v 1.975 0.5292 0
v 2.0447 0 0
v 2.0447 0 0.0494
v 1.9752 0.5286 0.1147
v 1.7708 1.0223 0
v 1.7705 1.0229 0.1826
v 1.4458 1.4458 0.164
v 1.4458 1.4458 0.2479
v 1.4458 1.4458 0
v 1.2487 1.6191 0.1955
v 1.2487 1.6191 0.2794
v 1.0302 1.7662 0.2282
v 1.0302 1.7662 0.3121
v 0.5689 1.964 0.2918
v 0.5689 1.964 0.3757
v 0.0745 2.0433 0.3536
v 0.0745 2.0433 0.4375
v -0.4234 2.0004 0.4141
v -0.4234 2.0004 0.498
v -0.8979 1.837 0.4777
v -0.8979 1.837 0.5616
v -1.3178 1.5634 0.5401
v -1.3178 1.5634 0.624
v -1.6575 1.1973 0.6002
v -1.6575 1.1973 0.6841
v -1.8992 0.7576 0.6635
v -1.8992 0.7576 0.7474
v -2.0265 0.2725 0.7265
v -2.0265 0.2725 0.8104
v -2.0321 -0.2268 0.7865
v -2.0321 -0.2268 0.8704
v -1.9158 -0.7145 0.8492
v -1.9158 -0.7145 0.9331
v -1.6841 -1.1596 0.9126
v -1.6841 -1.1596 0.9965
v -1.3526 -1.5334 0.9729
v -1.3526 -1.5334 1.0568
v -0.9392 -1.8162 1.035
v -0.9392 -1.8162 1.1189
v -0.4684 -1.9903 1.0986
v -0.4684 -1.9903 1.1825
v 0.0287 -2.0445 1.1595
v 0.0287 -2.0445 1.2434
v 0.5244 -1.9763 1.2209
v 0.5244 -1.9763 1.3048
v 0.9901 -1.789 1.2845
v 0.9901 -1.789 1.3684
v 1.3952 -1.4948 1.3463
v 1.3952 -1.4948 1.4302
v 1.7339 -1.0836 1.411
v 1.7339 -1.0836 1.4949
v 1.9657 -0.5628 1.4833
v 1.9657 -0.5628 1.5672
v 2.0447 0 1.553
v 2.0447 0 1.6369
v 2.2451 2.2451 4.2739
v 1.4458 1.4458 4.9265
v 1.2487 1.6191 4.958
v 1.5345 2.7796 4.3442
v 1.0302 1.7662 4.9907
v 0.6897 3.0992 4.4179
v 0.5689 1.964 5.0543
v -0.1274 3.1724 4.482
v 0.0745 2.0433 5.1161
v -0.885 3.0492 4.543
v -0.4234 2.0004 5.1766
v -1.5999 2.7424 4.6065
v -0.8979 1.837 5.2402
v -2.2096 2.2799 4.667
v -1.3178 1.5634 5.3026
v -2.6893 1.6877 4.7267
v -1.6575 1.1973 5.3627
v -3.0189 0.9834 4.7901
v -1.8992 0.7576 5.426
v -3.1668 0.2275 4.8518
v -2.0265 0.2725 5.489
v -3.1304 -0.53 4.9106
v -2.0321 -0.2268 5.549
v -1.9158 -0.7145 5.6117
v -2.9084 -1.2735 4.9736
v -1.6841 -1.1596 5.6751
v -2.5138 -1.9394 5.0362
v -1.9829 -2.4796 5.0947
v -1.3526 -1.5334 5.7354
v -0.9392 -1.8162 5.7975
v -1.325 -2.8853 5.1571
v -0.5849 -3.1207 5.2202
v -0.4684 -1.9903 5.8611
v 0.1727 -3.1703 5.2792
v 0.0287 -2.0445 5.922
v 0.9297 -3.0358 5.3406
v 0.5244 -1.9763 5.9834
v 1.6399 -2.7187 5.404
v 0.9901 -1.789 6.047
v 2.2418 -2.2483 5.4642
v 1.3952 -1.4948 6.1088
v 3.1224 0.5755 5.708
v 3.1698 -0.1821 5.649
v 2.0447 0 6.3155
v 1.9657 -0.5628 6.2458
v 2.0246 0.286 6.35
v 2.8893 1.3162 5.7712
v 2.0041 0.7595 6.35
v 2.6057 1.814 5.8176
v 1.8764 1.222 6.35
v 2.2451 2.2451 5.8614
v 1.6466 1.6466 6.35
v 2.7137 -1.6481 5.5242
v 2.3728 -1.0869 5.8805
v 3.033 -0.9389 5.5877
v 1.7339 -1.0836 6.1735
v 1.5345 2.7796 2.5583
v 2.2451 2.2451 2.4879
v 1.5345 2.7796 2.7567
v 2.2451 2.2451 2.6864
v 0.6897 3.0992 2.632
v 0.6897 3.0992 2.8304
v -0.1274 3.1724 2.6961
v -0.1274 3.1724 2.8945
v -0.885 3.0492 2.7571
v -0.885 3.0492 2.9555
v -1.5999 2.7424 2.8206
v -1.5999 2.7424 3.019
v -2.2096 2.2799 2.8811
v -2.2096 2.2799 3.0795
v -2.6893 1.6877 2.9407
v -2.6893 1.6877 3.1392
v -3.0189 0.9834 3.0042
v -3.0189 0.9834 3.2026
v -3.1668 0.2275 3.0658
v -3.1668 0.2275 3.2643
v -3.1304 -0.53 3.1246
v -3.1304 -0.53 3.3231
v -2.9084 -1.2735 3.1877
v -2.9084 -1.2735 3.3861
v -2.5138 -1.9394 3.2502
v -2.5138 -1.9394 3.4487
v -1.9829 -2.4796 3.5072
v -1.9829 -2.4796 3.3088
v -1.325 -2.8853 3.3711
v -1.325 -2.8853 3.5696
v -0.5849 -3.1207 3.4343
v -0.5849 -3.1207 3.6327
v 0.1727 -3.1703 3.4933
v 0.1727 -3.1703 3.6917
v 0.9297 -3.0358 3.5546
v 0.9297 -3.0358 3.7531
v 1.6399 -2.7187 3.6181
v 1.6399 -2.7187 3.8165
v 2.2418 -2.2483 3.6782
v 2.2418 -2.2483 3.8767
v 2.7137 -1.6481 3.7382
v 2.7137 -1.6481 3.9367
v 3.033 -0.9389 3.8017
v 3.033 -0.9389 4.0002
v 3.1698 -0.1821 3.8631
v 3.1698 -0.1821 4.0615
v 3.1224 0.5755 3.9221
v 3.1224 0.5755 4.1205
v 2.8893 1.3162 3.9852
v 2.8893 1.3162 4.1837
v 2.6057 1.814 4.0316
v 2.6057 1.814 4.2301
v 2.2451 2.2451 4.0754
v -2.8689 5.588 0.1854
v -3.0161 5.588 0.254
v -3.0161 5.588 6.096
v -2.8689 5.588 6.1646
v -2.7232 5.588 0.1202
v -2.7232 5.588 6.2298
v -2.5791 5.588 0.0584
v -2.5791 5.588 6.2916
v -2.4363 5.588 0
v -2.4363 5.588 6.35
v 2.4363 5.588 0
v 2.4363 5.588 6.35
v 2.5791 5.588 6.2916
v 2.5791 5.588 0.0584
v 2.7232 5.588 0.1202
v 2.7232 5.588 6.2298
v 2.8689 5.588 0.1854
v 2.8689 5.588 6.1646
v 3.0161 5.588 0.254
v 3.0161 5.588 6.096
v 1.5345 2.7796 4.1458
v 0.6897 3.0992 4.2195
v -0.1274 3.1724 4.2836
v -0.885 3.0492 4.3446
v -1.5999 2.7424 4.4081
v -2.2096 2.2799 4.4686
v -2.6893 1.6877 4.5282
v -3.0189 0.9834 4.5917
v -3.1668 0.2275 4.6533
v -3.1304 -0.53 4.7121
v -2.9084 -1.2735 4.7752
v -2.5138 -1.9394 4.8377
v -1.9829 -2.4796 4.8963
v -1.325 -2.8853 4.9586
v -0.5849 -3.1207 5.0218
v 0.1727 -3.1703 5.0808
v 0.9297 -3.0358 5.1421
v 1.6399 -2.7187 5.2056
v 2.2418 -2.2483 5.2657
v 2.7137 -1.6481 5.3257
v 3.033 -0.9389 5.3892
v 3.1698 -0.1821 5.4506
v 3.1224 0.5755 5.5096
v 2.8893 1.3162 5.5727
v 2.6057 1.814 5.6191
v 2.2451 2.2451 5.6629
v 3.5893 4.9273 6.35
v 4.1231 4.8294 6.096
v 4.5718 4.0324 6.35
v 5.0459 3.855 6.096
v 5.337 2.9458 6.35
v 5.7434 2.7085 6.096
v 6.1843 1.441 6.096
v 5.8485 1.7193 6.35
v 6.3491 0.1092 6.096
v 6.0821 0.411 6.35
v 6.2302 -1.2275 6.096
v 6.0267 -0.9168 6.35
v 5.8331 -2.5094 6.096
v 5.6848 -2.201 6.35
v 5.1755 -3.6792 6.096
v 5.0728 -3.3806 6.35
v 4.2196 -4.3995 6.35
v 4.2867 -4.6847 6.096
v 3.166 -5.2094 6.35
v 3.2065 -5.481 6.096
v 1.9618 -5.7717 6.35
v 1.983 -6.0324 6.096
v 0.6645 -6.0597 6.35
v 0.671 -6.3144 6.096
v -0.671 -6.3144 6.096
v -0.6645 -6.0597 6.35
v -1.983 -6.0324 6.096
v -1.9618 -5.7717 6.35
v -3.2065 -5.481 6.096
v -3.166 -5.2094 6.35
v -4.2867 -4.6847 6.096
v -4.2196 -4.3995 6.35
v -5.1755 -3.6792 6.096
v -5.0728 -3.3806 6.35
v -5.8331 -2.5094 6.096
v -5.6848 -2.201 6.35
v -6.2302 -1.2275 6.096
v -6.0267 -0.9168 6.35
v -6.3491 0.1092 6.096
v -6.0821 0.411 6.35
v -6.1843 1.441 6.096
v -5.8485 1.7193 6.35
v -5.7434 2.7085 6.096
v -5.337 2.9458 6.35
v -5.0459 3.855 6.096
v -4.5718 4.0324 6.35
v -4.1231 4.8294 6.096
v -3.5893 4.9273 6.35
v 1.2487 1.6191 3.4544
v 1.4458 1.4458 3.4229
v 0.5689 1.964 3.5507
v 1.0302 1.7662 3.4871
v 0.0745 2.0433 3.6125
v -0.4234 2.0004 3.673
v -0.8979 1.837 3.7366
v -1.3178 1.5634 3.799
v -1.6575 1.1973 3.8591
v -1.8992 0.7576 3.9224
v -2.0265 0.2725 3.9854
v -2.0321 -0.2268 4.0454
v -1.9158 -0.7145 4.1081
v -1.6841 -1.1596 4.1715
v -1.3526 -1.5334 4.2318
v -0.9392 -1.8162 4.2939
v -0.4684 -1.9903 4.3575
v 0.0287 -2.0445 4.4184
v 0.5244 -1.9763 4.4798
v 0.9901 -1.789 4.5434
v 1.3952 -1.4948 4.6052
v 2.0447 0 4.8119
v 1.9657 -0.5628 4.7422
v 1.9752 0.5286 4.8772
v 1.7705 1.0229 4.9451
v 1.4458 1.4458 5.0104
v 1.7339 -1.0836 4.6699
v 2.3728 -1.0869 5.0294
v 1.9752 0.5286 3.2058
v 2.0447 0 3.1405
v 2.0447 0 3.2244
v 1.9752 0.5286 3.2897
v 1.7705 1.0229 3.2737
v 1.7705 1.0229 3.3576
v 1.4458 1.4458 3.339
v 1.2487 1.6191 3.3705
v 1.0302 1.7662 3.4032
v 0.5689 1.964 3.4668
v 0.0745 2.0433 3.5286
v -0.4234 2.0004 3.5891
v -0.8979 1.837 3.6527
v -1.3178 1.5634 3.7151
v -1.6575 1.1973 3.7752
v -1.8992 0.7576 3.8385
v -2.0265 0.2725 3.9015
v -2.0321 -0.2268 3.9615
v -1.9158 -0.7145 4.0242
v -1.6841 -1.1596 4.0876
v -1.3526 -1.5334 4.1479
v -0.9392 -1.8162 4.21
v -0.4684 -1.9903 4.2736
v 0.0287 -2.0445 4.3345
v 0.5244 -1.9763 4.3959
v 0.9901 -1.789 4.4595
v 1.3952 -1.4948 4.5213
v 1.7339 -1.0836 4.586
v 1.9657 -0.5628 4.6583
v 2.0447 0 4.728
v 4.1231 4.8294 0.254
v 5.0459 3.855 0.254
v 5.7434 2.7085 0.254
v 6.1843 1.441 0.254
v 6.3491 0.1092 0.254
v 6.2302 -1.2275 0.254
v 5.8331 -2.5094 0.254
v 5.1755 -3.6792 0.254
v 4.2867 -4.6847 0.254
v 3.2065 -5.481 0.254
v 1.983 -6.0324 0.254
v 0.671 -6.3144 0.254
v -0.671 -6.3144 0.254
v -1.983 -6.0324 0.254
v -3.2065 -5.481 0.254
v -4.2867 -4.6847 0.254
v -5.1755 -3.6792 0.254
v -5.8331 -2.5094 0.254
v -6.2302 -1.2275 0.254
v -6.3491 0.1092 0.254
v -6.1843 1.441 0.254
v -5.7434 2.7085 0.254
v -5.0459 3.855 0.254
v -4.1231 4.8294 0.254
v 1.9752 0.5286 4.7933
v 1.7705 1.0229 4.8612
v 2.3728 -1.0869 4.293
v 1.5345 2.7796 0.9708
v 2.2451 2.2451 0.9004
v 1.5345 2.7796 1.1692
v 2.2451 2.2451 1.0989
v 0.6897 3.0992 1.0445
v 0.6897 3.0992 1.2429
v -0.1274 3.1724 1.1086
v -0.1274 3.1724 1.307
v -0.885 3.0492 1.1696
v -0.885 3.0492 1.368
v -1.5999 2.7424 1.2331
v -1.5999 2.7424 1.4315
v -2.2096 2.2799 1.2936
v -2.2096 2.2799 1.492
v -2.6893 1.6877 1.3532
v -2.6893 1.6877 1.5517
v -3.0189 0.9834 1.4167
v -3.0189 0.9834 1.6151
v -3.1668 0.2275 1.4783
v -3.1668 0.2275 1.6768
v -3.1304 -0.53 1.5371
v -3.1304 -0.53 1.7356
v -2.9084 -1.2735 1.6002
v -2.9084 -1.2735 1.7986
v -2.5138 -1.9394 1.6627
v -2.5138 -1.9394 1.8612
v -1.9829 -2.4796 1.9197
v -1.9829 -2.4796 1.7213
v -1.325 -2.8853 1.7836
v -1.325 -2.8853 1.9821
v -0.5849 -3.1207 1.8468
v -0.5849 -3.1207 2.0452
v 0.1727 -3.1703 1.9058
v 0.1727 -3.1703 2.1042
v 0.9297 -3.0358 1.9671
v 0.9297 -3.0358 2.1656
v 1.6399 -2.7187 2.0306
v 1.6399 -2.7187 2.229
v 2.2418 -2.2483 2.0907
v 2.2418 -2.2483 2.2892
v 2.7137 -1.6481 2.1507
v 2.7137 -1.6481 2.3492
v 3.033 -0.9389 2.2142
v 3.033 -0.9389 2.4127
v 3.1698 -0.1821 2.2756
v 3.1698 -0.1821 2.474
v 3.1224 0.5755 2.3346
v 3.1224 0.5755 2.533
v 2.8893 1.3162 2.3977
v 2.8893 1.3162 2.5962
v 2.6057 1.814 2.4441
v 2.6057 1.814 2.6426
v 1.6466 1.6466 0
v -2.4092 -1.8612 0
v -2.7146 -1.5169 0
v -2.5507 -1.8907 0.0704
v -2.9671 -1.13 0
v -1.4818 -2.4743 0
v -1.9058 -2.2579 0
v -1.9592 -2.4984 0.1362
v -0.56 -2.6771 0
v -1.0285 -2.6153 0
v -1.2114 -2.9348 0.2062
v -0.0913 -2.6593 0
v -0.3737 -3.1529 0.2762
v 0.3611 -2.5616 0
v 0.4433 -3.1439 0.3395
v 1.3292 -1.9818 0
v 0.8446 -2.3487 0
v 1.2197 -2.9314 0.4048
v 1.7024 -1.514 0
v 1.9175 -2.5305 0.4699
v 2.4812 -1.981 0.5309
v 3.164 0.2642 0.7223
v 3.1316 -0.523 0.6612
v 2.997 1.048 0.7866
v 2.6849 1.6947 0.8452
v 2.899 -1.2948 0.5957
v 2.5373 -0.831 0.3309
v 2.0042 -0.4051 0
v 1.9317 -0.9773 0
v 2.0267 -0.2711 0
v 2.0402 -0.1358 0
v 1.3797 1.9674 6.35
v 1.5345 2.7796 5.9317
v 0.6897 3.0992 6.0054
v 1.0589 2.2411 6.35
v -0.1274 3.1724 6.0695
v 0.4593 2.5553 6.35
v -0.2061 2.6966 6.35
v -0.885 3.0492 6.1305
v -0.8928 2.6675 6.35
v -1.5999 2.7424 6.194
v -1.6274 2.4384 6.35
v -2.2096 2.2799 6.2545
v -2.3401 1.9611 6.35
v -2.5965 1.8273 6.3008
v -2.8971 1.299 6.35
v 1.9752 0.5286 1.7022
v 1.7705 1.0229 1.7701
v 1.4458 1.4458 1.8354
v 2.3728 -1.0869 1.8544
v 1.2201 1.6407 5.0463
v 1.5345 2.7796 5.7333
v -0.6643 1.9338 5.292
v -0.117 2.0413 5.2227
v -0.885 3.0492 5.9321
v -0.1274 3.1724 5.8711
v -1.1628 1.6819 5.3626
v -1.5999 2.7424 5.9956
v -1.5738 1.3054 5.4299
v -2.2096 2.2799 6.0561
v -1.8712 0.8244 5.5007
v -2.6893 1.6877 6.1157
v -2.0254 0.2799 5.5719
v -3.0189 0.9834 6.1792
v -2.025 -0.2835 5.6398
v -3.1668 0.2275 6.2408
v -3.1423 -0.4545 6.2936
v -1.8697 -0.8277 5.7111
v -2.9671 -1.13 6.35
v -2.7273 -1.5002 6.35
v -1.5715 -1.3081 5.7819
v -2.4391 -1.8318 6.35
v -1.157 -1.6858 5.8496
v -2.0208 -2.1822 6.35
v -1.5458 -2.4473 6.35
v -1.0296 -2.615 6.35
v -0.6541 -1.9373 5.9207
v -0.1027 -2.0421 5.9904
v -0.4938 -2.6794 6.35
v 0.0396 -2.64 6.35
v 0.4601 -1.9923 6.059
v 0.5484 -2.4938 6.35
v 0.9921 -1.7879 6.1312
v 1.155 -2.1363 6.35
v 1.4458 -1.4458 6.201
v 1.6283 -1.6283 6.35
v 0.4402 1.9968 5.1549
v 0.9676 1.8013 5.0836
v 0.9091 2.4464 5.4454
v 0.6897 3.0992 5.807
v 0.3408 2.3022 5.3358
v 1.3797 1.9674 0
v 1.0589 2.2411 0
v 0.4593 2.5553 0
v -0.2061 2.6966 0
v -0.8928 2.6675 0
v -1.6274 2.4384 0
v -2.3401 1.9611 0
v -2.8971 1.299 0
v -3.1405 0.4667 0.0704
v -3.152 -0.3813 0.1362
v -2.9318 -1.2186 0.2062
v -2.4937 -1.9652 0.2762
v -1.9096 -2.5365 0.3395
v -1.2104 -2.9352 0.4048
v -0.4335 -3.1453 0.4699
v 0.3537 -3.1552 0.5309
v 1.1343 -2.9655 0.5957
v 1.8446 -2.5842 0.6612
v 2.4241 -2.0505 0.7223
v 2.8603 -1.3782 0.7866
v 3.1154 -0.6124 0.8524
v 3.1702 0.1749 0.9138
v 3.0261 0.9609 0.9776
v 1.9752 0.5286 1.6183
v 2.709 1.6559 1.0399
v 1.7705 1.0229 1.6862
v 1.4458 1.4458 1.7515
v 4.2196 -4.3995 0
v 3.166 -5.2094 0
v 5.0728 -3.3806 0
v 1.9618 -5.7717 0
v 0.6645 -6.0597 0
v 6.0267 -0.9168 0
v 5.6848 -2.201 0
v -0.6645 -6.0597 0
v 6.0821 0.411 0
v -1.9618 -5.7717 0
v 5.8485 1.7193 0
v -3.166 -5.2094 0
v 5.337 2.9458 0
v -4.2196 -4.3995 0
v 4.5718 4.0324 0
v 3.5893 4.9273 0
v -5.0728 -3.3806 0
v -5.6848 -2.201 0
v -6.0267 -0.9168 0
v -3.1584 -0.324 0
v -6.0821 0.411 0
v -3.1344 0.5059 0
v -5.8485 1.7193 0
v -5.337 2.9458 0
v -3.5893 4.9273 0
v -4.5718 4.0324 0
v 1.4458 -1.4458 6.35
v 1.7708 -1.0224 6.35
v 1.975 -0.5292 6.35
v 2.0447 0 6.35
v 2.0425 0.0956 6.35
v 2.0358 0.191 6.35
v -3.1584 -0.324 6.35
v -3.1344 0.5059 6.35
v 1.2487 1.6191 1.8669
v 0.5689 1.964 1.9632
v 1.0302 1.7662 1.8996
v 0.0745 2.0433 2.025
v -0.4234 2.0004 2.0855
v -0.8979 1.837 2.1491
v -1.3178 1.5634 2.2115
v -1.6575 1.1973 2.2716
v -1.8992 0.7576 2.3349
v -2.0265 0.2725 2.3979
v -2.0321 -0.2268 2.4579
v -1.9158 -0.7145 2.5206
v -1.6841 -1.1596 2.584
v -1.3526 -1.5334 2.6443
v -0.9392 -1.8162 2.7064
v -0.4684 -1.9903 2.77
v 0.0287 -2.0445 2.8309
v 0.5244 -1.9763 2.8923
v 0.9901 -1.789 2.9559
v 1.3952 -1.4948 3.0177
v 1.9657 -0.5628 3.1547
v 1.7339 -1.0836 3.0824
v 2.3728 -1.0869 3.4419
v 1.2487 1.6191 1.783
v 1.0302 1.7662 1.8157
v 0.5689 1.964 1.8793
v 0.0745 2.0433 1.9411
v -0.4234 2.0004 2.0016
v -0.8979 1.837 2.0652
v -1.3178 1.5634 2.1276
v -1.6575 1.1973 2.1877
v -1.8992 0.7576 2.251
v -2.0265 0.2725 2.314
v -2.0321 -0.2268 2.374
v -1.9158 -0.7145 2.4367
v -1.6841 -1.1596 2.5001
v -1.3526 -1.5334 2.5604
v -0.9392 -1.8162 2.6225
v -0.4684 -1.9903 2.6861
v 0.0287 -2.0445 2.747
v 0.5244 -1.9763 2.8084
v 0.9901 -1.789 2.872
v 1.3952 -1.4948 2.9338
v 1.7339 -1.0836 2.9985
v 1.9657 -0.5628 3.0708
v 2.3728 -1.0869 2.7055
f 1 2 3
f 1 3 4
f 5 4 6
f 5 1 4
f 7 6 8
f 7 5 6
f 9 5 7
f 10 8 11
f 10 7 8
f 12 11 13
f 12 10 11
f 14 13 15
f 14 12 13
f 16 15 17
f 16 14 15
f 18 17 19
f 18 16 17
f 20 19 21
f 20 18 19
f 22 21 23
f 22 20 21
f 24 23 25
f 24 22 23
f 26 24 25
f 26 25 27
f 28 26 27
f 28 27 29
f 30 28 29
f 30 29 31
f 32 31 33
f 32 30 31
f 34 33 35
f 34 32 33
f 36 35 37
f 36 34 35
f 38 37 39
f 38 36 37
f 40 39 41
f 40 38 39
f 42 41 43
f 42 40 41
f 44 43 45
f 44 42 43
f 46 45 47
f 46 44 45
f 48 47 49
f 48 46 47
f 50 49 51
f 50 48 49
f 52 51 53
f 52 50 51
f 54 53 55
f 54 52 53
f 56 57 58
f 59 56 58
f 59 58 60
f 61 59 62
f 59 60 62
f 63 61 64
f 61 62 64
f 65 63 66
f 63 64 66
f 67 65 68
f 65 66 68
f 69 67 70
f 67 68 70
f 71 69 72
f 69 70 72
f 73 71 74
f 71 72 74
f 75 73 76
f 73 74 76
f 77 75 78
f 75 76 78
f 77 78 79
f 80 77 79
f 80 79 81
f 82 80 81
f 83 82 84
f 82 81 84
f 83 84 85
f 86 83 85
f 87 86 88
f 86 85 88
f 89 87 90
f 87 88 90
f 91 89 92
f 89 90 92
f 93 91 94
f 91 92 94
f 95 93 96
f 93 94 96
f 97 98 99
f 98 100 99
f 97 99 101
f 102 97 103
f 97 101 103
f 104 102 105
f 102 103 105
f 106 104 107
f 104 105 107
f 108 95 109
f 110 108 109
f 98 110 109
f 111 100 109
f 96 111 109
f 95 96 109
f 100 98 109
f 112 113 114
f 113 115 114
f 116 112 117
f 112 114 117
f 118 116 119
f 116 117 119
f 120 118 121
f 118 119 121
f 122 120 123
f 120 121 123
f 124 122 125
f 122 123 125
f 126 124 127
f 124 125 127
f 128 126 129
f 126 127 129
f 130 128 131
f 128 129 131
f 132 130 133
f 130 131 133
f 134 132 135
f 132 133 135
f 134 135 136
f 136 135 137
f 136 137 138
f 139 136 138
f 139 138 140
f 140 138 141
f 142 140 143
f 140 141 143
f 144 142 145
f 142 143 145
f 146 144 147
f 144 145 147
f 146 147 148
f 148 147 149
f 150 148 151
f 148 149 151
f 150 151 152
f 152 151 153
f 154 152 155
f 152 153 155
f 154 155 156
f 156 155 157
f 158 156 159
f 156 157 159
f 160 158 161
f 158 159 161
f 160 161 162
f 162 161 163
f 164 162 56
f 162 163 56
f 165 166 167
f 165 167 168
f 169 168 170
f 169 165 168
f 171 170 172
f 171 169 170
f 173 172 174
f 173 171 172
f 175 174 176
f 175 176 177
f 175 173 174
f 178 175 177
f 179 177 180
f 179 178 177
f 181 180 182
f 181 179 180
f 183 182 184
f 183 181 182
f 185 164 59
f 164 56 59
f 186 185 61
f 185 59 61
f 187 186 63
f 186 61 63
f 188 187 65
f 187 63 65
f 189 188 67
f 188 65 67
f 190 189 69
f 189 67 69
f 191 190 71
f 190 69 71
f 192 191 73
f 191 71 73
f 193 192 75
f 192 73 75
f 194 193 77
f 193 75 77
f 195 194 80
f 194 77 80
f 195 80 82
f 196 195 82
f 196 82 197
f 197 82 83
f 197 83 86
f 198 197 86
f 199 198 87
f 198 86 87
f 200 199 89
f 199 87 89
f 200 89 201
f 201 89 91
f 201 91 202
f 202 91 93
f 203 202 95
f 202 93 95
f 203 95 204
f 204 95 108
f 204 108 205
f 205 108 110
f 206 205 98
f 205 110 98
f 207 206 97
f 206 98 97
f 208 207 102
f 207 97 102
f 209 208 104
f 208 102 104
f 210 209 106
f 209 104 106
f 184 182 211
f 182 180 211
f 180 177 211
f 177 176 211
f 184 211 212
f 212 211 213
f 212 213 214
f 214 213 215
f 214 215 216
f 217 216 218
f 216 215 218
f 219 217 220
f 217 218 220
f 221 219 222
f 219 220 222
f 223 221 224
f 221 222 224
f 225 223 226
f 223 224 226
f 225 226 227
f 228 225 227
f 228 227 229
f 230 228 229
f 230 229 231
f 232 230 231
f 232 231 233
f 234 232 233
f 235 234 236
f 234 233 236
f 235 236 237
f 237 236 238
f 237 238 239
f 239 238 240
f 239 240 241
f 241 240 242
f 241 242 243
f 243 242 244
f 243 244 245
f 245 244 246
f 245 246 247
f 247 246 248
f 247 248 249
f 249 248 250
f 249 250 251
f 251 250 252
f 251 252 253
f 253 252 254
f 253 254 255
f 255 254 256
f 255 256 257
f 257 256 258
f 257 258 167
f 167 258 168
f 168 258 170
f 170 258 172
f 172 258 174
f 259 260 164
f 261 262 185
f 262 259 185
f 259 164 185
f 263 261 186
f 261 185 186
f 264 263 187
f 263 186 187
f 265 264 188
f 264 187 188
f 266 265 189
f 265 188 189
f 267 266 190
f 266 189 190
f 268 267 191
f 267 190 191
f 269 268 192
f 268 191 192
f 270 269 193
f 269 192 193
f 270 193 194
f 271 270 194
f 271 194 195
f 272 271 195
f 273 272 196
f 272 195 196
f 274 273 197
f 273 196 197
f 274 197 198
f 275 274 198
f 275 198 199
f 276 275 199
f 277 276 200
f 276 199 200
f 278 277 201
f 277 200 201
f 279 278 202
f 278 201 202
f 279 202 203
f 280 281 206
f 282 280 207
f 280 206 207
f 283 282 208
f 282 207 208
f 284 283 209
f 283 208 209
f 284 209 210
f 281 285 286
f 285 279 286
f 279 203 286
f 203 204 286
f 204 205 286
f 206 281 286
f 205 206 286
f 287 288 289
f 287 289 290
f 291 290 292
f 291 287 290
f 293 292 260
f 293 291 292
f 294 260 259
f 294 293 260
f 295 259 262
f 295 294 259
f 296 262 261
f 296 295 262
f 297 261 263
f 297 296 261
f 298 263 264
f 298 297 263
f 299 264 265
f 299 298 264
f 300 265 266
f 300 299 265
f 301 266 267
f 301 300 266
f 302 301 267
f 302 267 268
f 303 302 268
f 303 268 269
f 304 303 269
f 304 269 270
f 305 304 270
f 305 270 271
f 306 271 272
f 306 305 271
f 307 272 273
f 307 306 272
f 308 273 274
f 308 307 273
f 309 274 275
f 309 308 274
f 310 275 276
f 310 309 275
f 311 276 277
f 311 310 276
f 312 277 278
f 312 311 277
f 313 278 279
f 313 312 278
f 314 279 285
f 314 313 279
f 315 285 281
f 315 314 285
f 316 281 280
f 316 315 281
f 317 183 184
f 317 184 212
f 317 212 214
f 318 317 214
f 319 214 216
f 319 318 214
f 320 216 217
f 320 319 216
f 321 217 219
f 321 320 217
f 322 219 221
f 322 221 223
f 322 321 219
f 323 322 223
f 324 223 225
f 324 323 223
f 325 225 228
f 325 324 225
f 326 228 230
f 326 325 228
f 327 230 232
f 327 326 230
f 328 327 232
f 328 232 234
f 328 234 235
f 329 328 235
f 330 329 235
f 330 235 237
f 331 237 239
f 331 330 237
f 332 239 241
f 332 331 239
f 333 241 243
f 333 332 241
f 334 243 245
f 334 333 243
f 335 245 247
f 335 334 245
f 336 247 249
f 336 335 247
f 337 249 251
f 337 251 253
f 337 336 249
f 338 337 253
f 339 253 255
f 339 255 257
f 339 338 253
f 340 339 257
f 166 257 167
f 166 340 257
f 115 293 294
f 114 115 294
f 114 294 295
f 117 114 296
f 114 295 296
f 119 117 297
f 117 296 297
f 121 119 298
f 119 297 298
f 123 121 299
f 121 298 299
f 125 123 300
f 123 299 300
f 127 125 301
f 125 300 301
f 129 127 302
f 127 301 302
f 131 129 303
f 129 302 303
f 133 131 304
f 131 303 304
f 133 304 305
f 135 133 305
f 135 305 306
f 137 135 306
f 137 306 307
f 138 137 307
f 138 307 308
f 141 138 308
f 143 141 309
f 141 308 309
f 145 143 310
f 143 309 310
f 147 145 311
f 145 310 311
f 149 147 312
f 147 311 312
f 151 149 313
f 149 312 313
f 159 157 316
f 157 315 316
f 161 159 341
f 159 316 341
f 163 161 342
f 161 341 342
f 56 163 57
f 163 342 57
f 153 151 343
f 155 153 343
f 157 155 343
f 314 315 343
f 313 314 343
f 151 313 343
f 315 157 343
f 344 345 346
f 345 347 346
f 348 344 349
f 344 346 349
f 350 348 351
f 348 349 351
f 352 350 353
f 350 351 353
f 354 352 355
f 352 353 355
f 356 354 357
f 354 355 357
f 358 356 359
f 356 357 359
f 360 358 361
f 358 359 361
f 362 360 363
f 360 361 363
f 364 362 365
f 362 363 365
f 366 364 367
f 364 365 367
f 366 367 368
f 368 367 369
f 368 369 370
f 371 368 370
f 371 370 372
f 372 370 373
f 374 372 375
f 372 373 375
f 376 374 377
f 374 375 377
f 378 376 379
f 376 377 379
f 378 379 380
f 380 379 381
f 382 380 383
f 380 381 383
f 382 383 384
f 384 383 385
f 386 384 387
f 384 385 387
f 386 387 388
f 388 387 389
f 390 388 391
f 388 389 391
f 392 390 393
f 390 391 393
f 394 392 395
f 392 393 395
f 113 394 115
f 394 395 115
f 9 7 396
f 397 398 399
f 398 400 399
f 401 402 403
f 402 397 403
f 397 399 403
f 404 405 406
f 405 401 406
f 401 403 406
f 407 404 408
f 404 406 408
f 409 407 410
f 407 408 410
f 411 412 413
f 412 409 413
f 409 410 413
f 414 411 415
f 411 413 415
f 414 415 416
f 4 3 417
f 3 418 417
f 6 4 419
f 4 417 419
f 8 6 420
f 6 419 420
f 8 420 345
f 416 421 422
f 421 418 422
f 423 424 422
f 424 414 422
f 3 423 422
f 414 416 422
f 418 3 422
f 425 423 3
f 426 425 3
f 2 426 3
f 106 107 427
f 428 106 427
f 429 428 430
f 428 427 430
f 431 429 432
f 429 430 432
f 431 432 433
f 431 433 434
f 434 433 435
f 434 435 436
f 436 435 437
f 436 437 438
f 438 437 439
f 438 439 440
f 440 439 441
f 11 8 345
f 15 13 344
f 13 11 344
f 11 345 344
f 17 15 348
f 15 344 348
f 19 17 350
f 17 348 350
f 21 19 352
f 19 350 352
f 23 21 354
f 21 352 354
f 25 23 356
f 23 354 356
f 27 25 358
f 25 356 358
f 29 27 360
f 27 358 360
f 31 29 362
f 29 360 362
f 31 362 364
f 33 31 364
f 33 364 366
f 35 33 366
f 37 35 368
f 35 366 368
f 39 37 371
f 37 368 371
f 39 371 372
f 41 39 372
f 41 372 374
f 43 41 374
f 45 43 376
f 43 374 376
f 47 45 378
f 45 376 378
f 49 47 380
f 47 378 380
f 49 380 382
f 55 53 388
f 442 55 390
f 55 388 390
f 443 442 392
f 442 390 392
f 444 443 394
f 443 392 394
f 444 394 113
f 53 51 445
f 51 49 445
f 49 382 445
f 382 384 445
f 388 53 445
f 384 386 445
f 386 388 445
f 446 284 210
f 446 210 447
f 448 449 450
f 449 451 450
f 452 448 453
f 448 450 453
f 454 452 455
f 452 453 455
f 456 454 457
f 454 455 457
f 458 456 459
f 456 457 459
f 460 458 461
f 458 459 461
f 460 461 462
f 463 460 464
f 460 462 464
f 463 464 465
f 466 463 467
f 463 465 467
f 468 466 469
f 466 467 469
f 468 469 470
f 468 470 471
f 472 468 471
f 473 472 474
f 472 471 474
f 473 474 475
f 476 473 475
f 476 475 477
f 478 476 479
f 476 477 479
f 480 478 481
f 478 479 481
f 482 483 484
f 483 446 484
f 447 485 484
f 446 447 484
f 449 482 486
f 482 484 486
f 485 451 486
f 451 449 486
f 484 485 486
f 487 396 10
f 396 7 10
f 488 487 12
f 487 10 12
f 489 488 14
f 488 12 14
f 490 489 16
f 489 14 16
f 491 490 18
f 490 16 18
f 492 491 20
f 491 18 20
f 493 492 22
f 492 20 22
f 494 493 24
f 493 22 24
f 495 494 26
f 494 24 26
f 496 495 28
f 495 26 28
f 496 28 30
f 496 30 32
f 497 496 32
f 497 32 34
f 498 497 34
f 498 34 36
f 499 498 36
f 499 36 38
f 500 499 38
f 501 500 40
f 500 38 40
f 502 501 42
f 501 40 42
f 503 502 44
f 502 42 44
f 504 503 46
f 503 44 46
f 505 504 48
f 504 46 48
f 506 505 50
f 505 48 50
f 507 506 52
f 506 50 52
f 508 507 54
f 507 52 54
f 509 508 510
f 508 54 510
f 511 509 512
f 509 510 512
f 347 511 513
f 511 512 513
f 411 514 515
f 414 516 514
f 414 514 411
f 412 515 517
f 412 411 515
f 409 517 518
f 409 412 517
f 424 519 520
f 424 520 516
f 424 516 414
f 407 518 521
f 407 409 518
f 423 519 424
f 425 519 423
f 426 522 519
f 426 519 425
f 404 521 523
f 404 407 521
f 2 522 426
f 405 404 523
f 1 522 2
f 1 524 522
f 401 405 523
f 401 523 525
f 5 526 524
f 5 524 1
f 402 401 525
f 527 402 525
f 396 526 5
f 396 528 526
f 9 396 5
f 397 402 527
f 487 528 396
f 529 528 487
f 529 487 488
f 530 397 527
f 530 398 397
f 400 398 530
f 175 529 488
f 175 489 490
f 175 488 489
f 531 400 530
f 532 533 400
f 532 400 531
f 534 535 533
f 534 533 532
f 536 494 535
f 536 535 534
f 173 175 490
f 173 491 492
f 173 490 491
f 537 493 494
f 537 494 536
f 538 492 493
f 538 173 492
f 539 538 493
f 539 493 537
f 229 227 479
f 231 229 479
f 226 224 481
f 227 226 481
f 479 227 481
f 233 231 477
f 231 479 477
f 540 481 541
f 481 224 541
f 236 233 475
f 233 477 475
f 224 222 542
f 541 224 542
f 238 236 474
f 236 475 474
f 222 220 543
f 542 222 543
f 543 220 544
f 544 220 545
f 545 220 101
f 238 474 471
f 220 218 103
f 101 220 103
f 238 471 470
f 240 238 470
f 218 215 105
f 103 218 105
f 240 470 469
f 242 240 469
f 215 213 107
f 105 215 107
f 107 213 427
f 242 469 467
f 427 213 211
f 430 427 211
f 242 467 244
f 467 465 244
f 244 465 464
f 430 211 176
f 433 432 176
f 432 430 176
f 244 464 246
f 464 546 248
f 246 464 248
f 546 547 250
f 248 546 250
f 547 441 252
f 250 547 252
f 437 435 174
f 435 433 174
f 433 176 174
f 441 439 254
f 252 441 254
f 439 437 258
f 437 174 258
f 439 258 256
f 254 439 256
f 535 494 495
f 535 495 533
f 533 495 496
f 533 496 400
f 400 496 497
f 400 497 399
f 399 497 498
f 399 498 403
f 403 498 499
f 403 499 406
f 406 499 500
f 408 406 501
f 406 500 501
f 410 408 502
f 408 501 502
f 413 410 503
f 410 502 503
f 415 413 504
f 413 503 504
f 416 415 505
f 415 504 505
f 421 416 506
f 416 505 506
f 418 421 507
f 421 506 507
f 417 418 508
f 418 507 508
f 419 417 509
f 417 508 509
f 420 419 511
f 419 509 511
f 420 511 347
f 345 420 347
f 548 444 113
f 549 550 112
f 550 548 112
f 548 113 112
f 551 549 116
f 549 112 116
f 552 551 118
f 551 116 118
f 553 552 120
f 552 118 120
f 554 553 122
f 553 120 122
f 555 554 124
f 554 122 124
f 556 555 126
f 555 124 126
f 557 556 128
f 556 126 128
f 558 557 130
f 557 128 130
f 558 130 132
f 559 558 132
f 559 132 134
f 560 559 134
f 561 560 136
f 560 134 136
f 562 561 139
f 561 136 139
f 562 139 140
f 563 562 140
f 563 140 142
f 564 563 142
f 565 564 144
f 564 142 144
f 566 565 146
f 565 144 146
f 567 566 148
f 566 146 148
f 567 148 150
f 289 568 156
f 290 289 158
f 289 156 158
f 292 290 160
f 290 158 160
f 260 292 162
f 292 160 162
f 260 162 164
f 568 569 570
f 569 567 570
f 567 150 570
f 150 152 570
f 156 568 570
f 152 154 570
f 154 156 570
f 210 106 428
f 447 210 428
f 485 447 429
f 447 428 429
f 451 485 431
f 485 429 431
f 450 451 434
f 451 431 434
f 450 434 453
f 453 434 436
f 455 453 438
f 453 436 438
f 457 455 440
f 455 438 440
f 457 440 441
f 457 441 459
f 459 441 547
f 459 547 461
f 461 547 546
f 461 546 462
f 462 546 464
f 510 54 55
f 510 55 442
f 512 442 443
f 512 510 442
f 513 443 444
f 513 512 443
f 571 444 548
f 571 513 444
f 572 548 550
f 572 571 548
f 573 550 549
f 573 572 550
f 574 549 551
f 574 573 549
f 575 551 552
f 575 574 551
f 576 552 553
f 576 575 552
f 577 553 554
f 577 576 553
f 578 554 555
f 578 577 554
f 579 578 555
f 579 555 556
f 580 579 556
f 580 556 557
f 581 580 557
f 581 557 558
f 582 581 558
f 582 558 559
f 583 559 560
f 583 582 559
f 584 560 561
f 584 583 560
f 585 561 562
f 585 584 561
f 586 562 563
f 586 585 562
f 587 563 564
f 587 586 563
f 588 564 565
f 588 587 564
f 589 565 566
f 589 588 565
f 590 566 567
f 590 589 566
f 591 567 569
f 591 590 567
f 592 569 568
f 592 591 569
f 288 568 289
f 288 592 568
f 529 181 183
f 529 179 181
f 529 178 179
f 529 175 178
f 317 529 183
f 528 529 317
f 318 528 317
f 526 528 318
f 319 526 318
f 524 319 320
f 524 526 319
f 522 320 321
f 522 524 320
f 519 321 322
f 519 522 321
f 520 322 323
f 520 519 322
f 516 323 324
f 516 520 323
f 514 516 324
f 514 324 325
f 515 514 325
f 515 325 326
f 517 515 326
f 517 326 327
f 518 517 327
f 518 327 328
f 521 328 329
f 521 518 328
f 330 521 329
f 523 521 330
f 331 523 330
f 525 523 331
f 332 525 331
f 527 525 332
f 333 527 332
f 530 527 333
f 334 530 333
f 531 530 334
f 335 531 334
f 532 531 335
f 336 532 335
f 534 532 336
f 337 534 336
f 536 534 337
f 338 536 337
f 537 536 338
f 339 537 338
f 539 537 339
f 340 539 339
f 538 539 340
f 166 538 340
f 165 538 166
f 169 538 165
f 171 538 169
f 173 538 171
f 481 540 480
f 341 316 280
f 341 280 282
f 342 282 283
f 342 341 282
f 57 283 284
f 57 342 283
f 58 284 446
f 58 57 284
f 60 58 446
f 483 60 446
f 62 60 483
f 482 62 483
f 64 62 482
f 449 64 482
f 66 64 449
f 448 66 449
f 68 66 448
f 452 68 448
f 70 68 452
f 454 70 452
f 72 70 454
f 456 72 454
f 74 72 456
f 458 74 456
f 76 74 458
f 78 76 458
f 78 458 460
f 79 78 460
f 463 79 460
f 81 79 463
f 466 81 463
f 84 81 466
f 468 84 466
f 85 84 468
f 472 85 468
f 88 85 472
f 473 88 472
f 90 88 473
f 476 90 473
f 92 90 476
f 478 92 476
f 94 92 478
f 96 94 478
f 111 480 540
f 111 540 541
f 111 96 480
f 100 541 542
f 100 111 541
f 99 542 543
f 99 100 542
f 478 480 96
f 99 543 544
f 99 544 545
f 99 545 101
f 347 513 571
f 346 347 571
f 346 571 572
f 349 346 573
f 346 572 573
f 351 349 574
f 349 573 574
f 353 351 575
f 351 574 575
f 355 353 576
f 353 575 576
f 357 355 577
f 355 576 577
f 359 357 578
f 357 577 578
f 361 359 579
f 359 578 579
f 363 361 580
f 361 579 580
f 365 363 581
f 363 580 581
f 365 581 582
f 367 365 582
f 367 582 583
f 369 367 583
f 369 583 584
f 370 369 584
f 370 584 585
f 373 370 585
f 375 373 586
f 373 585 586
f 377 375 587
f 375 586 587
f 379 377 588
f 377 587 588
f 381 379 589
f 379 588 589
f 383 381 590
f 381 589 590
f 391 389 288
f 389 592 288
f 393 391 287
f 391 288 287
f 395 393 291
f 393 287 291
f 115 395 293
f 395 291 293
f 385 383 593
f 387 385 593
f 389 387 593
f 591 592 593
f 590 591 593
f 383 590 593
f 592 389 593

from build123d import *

# Parameters (mm, degrees)
SKETCH1_R           = 2.0447
BOSS_EXTRUDE1_DEPTH = 6.35
CUT_SWEEP1_PITCH    = 1.5875
CHAMFER1_SIZE       = 0.254


with BuildPart() as part:
    # Sketch1 → Boss-Extrude1 (new body)
    with BuildSketch(Plane.XY):
        with BuildLine():
            Line((-3.01608289, 5.588), (3.01608289, 5.588))
            ThreePointArc((3.01608289, 5.588), (0, -6.35), (-3.01608289, 5.588))
        make_face()
        Circle(SKETCH1_R, mode=Mode.SUBTRACT)
    extrude(amount=BOSS_EXTRUDE1_DEPTH)

    # Cut-Sweep1: arcs per turn and ends read off the stored shape
    # Cut-Sweep1: the profile of Sketch2 profile screwed along a right-hand helix through 4.75 turns, 8 arcs to a turn; built about Z, then put on its axis
    cut_sweep1_z = Axis((0, 0, 0), (0, 0, 1))
    cut_sweep1_corners = [(2.0444, 0, -1.339811764), (3.175, 0, -0.68705955), (3.175, 0, -0.48862205), (2.0444, 0, 0.164130164)]
    with BuildLine(mode=Mode.PRIVATE) as cut_sweep1_profile:
        Line(cut_sweep1_corners[0], cut_sweep1_corners[1])
        Line(cut_sweep1_corners[1], cut_sweep1_corners[2])
        Line(cut_sweep1_corners[2], cut_sweep1_corners[3])
        Line(cut_sweep1_corners[3], cut_sweep1_corners[0])
    cut_sweep1_cap = Face(cut_sweep1_profile.wire())
    cut_sweep1_turn_angles = [0, 22.5, 45, 67.5, 90, 112.5, 135, 157.5, 180, 202.5, 225, 247.5, 270, 292.5, 315, 337.5, 360]
    cut_sweep1_turn_weights = [1, 0.9238795325112867, 1, 0.9238795325112867, 1, 0.9238795325112867, 1, 0.9238795325112867, 1, 0.9238795325112867, 1, 0.9238795325112867, 1, 0.9238795325112867, 1, 0.9238795325112867, 1]
    cut_sweep1_turn_rails = [Edge.make_bspline([Vector(p[0], p[1], 0).rotate(cut_sweep1_z, cut_sweep1_turn_angles[k]) / cut_sweep1_turn_weights[k] + Vector(0, 0, p[2] + CUT_SWEEP1_PITCH * cut_sweep1_turn_angles[k] / 360) for k in range(17)], [0, 0, 0, 1, 1, 2, 2, 3, 3, 4, 4, 5, 5, 6, 6, 7, 7, 8, 8, 8], 2, cut_sweep1_turn_weights) for p in cut_sweep1_corners]
    cut_sweep1_turn_sides = [Face.make_surface_from_curves(cut_sweep1_turn_rails[p[0]], cut_sweep1_turn_rails[p[1]]) for p in [(0, 1), (1, 2), (2, 3), (3, 0)]]
    cut_sweep1_last_angles = [1440, 1462.5, 1485, 1507.5, 1530, 1552.5, 1575, 1597.5, 1620, 1642.5, 1665, 1687.5, 1710]
    cut_sweep1_last_weights = [1, 0.9238795325112867, 1, 0.9238795325112867, 1, 0.9238795325112867, 1, 0.9238795325112867, 1, 0.9238795325112867, 1, 0.9238795325112769, 1]
    cut_sweep1_last_rails = [Edge.make_bspline([Vector(p[0], p[1], 0).rotate(cut_sweep1_z, cut_sweep1_last_angles[k]) / cut_sweep1_last_weights[k] + Vector(0, 0, p[2] + CUT_SWEEP1_PITCH * cut_sweep1_last_angles[k] / 360) for k in range(13)], [0, 0, 0, 1, 1, 2, 2, 3, 3, 4, 4, 5, 5, 6, 6, 6], 2, cut_sweep1_last_weights) for p in cut_sweep1_corners]
    cut_sweep1_last_sides = [Face.make_surface_from_curves(cut_sweep1_last_rails[p[0]], cut_sweep1_last_rails[p[1]]) for p in [(0, 1), (1, 2), (2, 3), (3, 0)]]
    cut_sweep1 = Plane(origin=(0, 0, 0), x_dir=(0.7071067811865512, 0.7071067811865438, 0), z_dir=(0, 0, 1)) * Solid(Shell([*[p.moved(Location((0, 0, CUT_SWEEP1_PITCH * i))) for i in range(4) for p in cut_sweep1_turn_sides], *cut_sweep1_last_sides, cut_sweep1_cap, cut_sweep1_cap.rotate(cut_sweep1_z, 1710).moved(Location((0, 0, CUT_SWEEP1_PITCH * 1710 / 360)))]))
    add(cut_sweep1, mode=Mode.SUBTRACT)

    # Chamfer1
    chamfer1_edges = [part.edges().sort_by_distance(p)[0] for p in [
        (0, -6.35, 0),
        (0, -6.35, 6.35),
    ]]
    chamfer(chamfer1_edges, length=CHAMFER1_SIZE)


solid = part.part
